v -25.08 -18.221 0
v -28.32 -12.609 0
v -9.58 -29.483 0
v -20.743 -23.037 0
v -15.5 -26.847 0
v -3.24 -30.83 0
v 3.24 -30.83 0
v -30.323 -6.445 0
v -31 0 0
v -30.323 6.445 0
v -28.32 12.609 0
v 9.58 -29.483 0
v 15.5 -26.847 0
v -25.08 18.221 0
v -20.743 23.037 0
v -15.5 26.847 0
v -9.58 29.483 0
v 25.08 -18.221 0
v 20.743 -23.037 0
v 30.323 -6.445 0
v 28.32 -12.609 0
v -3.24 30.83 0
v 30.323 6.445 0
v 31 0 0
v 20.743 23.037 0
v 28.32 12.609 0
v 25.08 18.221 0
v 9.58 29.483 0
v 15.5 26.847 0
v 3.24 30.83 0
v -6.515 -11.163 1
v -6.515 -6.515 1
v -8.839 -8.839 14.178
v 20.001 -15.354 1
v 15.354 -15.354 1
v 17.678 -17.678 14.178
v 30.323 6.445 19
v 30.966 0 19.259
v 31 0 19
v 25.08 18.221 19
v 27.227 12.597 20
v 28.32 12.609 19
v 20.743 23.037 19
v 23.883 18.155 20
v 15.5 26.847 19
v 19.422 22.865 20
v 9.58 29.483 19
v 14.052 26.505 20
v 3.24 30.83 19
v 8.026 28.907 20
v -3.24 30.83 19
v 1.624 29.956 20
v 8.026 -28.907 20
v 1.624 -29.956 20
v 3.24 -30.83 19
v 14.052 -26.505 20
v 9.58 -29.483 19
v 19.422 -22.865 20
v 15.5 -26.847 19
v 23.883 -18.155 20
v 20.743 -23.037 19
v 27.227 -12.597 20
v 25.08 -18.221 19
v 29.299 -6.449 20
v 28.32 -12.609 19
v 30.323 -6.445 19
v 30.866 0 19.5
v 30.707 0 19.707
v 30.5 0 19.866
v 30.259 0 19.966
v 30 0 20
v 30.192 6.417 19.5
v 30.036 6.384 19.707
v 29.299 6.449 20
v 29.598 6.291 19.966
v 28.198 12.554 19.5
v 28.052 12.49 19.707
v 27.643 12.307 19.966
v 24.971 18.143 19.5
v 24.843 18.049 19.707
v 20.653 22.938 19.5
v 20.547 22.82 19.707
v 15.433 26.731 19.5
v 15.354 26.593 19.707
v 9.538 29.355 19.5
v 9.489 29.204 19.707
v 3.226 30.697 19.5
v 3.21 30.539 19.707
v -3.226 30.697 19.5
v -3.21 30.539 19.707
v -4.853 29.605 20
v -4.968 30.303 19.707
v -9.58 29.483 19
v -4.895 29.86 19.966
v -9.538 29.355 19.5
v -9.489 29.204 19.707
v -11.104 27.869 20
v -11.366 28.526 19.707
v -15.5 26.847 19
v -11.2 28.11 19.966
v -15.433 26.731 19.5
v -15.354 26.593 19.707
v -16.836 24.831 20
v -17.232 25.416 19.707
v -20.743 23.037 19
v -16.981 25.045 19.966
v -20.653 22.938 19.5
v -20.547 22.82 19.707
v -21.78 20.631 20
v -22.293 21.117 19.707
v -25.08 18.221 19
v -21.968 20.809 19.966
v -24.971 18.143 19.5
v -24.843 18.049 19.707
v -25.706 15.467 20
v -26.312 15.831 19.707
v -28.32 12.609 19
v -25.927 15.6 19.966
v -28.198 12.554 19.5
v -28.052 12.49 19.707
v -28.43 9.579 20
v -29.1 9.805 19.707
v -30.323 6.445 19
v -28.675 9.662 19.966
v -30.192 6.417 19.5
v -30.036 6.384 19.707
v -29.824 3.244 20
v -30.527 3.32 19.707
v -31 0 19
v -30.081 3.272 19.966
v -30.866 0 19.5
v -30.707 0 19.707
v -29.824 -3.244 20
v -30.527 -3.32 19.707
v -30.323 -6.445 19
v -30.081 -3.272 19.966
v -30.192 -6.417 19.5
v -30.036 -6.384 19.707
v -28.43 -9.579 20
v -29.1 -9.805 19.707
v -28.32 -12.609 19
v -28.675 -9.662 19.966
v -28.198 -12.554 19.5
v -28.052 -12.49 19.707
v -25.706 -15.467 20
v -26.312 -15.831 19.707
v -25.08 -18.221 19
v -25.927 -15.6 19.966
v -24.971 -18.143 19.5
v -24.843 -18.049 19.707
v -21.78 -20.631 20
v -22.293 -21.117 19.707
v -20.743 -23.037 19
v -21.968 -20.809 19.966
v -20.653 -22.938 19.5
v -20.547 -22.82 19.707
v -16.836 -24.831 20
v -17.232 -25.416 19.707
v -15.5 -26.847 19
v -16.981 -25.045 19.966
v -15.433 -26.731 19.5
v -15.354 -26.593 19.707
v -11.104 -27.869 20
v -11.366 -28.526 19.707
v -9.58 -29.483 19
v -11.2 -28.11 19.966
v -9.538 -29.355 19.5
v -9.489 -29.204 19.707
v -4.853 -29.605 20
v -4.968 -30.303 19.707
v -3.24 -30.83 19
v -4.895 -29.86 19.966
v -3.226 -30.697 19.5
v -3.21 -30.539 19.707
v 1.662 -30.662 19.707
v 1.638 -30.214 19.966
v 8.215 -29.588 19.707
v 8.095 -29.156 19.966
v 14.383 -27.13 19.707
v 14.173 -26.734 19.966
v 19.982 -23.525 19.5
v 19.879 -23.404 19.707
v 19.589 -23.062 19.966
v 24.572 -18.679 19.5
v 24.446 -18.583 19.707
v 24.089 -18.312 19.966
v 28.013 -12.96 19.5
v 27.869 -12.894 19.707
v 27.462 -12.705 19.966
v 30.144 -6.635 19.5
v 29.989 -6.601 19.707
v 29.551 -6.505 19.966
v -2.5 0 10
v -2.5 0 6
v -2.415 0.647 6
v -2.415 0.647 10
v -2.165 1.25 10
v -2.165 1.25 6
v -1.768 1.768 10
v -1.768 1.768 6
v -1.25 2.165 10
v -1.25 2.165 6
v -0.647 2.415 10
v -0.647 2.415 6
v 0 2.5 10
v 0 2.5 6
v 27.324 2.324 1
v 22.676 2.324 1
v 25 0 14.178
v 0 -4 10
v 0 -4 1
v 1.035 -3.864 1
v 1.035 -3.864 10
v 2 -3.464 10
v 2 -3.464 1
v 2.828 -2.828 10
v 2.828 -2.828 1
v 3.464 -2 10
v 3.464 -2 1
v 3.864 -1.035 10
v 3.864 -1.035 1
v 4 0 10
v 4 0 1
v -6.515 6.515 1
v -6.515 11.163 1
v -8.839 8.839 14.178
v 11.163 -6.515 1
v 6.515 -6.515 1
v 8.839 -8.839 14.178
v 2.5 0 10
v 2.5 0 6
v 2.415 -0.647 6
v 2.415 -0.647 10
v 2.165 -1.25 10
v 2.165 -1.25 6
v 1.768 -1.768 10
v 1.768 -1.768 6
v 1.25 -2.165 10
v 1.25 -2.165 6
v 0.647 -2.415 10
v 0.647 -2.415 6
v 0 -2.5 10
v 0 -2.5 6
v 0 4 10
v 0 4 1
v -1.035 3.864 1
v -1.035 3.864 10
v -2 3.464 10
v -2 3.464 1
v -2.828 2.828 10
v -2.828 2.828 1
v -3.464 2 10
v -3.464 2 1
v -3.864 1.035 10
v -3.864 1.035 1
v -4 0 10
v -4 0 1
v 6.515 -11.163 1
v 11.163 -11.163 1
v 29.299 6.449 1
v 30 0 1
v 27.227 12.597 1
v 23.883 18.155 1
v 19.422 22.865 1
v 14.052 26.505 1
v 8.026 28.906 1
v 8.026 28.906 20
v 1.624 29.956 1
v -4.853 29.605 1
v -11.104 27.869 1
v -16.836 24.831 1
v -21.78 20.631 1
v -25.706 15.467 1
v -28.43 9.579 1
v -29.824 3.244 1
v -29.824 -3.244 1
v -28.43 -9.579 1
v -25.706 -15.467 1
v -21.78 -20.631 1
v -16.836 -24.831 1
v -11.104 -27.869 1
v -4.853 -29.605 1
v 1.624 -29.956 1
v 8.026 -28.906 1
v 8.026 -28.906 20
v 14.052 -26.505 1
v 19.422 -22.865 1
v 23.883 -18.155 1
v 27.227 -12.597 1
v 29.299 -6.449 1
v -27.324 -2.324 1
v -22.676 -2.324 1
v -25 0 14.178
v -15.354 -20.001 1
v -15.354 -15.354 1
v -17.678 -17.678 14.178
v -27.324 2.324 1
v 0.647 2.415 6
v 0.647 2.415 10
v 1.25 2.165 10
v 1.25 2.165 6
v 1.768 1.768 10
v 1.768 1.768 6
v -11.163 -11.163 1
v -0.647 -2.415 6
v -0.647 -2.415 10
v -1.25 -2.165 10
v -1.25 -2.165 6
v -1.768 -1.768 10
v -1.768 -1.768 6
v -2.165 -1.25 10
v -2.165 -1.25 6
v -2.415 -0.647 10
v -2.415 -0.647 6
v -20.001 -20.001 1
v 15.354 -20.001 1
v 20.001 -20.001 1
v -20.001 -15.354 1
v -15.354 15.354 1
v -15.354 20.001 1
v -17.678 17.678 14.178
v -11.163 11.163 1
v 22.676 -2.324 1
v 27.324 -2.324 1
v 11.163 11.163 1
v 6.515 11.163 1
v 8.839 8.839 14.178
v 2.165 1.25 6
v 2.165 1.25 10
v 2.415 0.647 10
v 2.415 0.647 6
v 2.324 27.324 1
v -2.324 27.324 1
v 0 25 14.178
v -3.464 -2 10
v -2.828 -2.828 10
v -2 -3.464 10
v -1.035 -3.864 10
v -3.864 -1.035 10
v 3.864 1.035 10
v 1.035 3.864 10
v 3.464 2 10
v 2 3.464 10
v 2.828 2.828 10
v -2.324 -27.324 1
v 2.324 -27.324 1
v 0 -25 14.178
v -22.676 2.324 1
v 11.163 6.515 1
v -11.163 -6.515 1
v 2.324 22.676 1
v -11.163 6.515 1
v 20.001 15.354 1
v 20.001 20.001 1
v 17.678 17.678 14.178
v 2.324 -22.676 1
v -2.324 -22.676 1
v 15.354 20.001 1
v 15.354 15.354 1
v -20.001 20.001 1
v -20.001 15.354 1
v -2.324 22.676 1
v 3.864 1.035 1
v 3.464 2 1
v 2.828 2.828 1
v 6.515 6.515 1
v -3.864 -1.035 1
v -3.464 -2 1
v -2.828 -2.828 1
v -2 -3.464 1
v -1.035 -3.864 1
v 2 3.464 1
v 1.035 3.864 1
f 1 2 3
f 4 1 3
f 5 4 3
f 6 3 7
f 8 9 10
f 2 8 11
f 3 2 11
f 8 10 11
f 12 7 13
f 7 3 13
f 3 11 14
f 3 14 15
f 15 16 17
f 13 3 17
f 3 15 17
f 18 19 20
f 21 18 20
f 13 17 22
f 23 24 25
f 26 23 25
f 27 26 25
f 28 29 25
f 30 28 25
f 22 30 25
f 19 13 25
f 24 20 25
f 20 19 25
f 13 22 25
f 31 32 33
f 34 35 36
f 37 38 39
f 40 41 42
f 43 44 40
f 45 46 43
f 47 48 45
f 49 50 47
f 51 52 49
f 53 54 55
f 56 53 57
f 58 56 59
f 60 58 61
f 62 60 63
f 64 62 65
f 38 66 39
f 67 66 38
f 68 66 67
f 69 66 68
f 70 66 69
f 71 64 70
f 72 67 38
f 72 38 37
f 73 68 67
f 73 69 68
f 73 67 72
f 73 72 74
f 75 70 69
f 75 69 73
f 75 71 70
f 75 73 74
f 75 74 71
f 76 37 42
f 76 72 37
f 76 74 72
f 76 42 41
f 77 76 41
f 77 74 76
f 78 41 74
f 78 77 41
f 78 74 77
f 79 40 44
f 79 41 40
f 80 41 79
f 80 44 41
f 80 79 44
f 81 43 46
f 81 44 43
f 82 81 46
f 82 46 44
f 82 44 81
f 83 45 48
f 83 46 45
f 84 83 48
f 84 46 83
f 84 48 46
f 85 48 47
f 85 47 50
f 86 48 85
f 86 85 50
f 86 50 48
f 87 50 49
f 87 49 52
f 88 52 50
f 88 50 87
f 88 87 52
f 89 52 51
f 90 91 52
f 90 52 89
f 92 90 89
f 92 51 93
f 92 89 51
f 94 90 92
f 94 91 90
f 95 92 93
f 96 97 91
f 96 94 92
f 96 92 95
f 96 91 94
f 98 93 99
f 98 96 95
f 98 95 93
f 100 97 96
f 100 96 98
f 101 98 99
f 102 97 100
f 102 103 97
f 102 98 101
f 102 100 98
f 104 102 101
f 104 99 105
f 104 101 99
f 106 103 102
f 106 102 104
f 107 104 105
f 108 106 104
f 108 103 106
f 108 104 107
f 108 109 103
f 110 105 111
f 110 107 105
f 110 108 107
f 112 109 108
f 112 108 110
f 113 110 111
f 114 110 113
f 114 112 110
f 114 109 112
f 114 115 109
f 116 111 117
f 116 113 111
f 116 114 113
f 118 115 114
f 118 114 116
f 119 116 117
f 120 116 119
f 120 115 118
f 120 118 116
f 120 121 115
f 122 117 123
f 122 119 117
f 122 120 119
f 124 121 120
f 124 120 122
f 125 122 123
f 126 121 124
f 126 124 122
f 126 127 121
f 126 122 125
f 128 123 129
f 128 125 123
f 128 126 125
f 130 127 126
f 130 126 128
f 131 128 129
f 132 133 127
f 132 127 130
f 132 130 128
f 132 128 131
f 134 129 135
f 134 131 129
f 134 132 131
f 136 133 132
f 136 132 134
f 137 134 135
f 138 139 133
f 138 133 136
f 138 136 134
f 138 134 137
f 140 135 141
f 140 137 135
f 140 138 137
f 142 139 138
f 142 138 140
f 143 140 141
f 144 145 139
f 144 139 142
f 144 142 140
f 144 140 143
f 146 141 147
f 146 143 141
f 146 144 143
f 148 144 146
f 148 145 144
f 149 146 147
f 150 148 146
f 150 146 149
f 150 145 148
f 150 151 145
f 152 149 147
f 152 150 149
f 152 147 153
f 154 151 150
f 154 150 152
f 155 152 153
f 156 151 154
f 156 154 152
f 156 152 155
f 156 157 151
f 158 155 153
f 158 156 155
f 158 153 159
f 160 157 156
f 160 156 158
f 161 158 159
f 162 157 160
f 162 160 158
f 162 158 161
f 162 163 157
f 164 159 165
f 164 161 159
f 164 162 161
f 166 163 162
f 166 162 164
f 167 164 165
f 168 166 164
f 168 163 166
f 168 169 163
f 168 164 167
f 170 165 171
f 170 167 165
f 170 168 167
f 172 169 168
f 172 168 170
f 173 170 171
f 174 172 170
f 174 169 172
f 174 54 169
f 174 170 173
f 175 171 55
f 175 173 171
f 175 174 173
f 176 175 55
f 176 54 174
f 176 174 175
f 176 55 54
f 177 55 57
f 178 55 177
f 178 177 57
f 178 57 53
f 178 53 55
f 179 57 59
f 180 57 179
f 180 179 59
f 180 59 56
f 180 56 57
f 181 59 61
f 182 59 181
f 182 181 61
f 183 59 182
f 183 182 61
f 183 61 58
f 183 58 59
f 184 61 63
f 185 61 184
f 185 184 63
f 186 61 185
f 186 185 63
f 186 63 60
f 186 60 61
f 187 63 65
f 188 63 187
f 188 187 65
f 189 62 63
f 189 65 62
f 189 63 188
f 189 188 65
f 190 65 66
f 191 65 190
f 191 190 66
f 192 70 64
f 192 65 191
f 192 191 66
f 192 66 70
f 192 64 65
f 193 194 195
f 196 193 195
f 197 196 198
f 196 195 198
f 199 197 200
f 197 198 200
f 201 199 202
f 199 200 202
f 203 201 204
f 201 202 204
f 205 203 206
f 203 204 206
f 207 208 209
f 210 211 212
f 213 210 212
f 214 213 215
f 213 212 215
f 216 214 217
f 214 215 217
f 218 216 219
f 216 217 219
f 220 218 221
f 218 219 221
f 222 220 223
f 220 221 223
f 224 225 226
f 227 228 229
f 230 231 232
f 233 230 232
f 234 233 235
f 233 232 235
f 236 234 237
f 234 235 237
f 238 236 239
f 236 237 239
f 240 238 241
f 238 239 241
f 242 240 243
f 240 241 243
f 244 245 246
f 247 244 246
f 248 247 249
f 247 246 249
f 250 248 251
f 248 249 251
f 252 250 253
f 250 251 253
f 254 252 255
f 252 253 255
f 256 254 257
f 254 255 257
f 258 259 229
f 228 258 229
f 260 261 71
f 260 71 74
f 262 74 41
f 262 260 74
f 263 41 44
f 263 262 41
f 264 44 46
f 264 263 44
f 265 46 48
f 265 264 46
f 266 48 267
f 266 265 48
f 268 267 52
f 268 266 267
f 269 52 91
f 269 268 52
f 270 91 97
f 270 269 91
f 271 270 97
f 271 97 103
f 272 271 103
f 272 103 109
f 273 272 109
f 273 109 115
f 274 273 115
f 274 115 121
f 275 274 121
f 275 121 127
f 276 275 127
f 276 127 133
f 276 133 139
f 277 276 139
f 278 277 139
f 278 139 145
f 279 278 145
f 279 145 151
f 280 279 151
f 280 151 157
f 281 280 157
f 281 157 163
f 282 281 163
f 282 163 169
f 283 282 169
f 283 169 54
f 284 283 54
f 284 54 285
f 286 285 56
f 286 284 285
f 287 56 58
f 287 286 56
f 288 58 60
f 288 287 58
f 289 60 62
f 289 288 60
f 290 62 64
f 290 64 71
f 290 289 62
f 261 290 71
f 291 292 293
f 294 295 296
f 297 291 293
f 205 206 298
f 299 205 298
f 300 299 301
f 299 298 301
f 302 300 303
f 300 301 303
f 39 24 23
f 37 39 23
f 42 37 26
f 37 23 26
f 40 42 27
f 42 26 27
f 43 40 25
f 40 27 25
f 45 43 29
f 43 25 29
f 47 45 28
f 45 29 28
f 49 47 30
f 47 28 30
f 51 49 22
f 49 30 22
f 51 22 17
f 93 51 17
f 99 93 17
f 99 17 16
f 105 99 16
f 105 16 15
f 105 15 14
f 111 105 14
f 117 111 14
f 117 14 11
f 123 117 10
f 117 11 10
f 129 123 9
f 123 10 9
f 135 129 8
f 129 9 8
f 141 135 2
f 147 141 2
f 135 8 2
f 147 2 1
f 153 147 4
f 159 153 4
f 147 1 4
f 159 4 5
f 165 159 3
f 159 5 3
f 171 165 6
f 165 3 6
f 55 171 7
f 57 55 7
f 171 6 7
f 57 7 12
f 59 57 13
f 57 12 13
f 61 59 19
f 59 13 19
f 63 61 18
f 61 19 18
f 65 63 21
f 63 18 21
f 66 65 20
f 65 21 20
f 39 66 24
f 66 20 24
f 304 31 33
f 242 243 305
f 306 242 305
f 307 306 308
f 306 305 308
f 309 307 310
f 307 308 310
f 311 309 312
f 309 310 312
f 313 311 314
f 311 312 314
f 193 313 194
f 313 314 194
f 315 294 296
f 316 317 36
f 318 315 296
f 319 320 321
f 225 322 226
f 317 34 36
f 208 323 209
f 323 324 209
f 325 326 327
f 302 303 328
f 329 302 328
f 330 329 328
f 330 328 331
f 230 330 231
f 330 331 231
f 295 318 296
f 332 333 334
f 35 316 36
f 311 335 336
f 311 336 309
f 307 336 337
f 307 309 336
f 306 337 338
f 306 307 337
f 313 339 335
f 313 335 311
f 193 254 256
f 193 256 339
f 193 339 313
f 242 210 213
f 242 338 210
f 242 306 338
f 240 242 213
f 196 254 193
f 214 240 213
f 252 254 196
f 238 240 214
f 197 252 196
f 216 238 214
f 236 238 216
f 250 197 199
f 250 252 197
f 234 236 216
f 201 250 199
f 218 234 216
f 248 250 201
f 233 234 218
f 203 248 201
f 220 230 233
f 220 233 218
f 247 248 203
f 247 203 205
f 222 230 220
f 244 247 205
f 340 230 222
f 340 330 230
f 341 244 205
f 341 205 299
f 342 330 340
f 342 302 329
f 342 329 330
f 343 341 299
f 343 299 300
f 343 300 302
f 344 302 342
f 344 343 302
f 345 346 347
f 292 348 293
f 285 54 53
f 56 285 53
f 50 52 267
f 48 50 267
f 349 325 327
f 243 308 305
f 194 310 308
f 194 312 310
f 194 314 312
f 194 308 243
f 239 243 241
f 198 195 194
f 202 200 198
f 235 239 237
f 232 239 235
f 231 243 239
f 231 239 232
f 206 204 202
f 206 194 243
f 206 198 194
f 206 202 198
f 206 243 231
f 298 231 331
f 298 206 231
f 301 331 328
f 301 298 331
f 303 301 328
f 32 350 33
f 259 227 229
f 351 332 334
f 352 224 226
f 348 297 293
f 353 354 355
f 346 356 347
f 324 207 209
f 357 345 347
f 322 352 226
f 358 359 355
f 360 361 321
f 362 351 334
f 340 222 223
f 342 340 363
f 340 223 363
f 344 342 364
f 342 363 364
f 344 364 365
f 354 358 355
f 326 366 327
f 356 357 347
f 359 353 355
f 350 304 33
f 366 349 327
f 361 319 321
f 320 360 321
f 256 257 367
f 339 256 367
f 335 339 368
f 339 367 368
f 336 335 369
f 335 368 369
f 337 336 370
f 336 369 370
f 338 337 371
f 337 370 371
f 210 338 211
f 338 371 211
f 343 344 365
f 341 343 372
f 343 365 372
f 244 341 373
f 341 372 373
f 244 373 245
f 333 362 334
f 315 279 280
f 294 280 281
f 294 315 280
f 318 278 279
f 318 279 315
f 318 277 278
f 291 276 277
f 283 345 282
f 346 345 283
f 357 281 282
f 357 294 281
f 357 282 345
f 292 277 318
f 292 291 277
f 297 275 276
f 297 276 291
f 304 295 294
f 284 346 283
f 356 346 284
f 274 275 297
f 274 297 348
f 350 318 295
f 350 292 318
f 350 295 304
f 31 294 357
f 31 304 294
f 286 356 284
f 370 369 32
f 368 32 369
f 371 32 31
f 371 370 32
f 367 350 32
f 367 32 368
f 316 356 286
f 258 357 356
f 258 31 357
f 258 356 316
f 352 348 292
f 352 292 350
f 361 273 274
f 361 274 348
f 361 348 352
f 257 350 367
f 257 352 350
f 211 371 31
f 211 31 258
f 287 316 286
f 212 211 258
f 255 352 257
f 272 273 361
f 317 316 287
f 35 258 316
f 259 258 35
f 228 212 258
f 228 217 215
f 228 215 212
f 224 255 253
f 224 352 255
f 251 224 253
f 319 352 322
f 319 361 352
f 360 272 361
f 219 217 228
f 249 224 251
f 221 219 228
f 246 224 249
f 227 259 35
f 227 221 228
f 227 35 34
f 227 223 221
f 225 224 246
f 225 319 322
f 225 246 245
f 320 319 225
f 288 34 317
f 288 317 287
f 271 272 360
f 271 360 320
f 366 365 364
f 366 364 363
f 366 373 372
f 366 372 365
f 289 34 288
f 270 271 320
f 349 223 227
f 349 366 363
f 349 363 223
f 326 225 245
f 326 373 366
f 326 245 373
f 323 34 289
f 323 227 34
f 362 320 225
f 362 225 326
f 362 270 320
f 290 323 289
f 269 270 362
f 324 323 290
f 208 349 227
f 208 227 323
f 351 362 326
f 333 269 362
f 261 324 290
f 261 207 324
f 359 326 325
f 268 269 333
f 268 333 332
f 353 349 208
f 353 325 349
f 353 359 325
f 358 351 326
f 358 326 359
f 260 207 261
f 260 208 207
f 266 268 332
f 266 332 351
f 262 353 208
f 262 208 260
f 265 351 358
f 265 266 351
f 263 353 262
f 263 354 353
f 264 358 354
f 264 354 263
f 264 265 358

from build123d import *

# Parameters (mm, degrees)
F0_R     = 31
F0_R_2   = 30
F0_W     = 5
F0_H     = 5
F1_DEPTH = 1
F2_DEPTH = 20
F3_DEPTH = 10
F4_DEPTH = 15
F4_TAPER = 10
F5_R     = 0.99999
F6_DEPTH = 5


# Not quite as in the source:
# - a fillet or chamfer is up to 0.001 mm smaller than in the source, because OpenCascade refuses the exact size


with BuildPart() as f1:
    # F0 (on Top) → F1 (new body)
    with BuildSketch(Plane.XY):
        Circle(F0_R)
        Circle(F0_R_2, mode=Mode.SUBTRACT)
        Circle(F0_R_2)
        with Locations((-17.6776695297, -17.6776695297)):
            Rectangle(F0_W, F0_H, mode=Mode.SUBTRACT)
        Polygon((-2.5, -22.5), (0, -22.5), (2.5, -22.5), (2.5, -27.5), (-2.5, -27.5), align=None, mode=Mode.SUBTRACT)
        with Locations((17.6776695297, -17.6776695297)):
            Rectangle(F0_W, F0_H, mode=Mode.SUBTRACT)
        Polygon((-22.5, 2.5), (-22.5, 0), (-22.5, -2.5), (-27.5, -2.5), (-27.5, 2.5), align=None, mode=Mode.SUBTRACT)
        with Locations((-17.6776695297, 17.6776695297)):
            Rectangle(F0_W, F0_H, mode=Mode.SUBTRACT)
        with BuildLine():
            ThreePointArc((-15.1776695297, 15.1776695297), (-8.2140955588, 19.8305809006), (0, 21.4644660941))
            ThreePointArc((0, 21.4644660941), (8.2140955588, 19.8305809006), (15.1776695297, 15.1776695297))
            ThreePointArc((15.1776695297, 15.1776695297), (19.8305809006, 8.2140955588), (21.4644660941, 0))
            ThreePointArc((21.4644660941, 0), (19.8305809006, -8.2140955588), (15.1776695297, -15.1776695297))
            ThreePointArc((15.1776695297, -15.1776695297), (8.2140955588, -19.8305809006), (0, -21.4644660941))
            ThreePointArc((0, -21.4644660941), (-8.2140955588, -19.8305809006), (-15.1776695297, -15.1776695297))
            ThreePointArc((-15.1776695297, -15.1776695297), (-19.8305809006, -8.2140955588), (-21.4644660941, 0))
            ThreePointArc((-21.4644660941, 0), (-19.8305809006, 8.2140955588), (-15.1776695297, 15.1776695297))
        make_face(mode=Mode.SUBTRACT)
        Polygon((22.5, -2.5), (22.5, 0), (22.5, 2.5), (27.5, 2.5), (27.5, -2.5), align=None, mode=Mode.SUBTRACT)
        Polygon((2.5, 22.5), (0, 22.5), (-2.5, 22.5), (-2.5, 27.5), (2.5, 27.5), align=None, mode=Mode.SUBTRACT)
        with Locations((17.6776695297, 17.6776695297)):
            Rectangle(F0_W, F0_H, mode=Mode.SUBTRACT)
        with BuildLine():
            Line((0, 21.4644660941), (0, 12.5))
            ThreePointArc((0, 12.5), (3.2848701936, 12.0606644847), (6.3388347648, 10.7735404498))
            Line((6.3388347648, 10.7735404498), (6.3388347648, 11.3388347648))
            Line((6.3388347648, 11.3388347648), (11.3388347648, 11.3388347648))
            Line((11.3388347648, 11.3388347648), (15.1776695297, 15.1776695297))
            ThreePointArc((15.1776695297, 15.1776695297), (8.2140955588, 19.8305809006), (0, 21.4644660941))
        make_face()
        with BuildLine():
            ThreePointArc((10.7735404498, 6.3388347648), (12.0606644847, 3.2848701936), (12.5, 0))
            Line((12.5, 0), (21.4644660941, 0))
            ThreePointArc((21.4644660941, 0), (19.8305809006, 8.2140955588), (15.1776695297, 15.1776695297))
            Line((15.1776695297, 15.1776695297), (11.3388347648, 11.3388347648))
            Line((11.3388347648, 11.3388347648), (11.3388347648, 6.3388347648))
            Line((11.3388347648, 6.3388347648), (10.7735404498, 6.3388347648))
        make_face()
        with BuildLine():
            ThreePointArc((6.3388347648, -10.7735404498), (3.2848701936, -12.0606644847), (0, -12.5))
            Line((0, -12.5), (0, -21.4644660941))
            ThreePointArc((0, -21.4644660941), (8.2140955588, -19.8305809006), (15.1776695297, -15.1776695297))
            ThreePointArc((15.1776695297, -15.1776695297), (19.8305809006, -8.2140955588), (21.4644660941, 0))
            Line((21.4644660941, 0), (12.5, 0))
            ThreePointArc((12.5, 0), (12.0606644847, -3.2848701936), (10.7735404498, -6.3388347648))
            Line((10.7735404498, -6.3388347648), (11.3388347648, -6.3388347648))
            Line((11.3388347648, -6.3388347648), (11.3388347648, -11.3388347648))
            Line((11.3388347648, -11.3388347648), (6.3388347648, -11.3388347648))
            Line((6.3388347648, -11.3388347648), (6.3388347648, -10.7735404498))
        make_face()
        with BuildLine():
            Line((0, -21.4644660941), (0, -12.5))
            ThreePointArc((0, -12.5), (-3.2848701936, -12.0606644847), (-6.3388347648, -10.7735404498))
            Line((-6.3388347648, -10.7735404498), (-6.3388347648, -11.3388347648))
            Line((-6.3388347648, -11.3388347648), (-11.3388347648, -11.3388347648))
            Line((-11.3388347648, -11.3388347648), (-11.3388347648, -6.3388347648))
            Line((-11.3388347648, -6.3388347648), (-10.7735404498, -6.3388347648))
            ThreePointArc((-10.7735404498, -6.3388347648), (-12.0606644847, -3.2848701936), (-12.5, 0))
            Line((-12.5, 0), (-21.4644660941, 0))
            ThreePointArc((-21.4644660941, 0), (-19.8305809006, -8.2140955588), (-15.1776695297, -15.1776695297))
            ThreePointArc((-15.1776695297, -15.1776695297), (-8.2140955588, -19.8305809006), (0, -21.4644660941))
        make_face()
        with BuildLine():
            ThreePointArc((-6.3388347648, 10.7735404498), (-3.2848701936, 12.0606644847), (0, 12.5))
            Line((0, 12.5), (0, 21.4644660941))
            ThreePointArc((0, 21.4644660941), (-8.2140955588, 19.8305809006), (-15.1776695297, 15.1776695297))
            ThreePointArc((-15.1776695297, 15.1776695297), (-19.8305809006, 8.2140955588), (-21.4644660941, 0))
            Line((-21.4644660941, 0), (-12.5, 0))
            ThreePointArc((-12.5, 0), (-12.0606644847, 3.2848701936), (-10.7735404498, 6.3388347648))
            Line((-10.7735404498, 6.3388347648), (-11.3388347648, 6.3388347648))
            Line((-11.3388347648, 6.3388347648), (-11.3388347648, 11.3388347648))
            Line((-11.3388347648, 11.3388347648), (-6.3388347648, 11.3388347648))
            Line((-6.3388347648, 11.3388347648), (-6.3388347648, 10.7735404498))
        make_face()
        with BuildLine():
            Line((0, 12.5), (0, 4))
            ThreePointArc((0, 4), (1.5307337295, 3.69551813), (2.8284271247, 2.8284271247))
            Line((2.8284271247, 2.8284271247), (6.3388347648, 6.3388347648))
            Line((6.3388347648, 6.3388347648), (6.3388347648, 10.7735404498))
            ThreePointArc((6.3388347648, 10.7735404498), (3.2848701936, 12.0606644847), (0, 12.5))
        make_face()
        with BuildLine():
            ThreePointArc((-4, 0), (-2.8284271247, 2.8284271247), (0, 4))
            Line((0, 4), (0, 12.5))
            ThreePointArc((0, 12.5), (-3.2848701936, 12.0606644847), (-6.3388347648, 10.7735404498))
            Line((-6.3388347648, 10.7735404498), (-6.3388347648, 6.3388347648))
            Line((-6.3388347648, 6.3388347648), (-10.7735404498, 6.3388347648))
            ThreePointArc((-10.7735404498, 6.3388347648), (-12.0606644847, 3.2848701936), (-12.5, 0))
            Line((-12.5, 0), (-4, 0))
        make_face()
        with BuildLine():
            ThreePointArc((2.8284271247, 2.8284271247), (3.69551813, 1.5307337295), (4, 0))
            Line((4, 0), (12.5, 0))
            ThreePointArc((12.5, 0), (12.0606644847, 3.2848701936), (10.7735404498, 6.3388347648))
            Line((10.7735404498, 6.3388347648), (6.3388347648, 6.3388347648))
            Line((6.3388347648, 6.3388347648), (2.8284271247, 2.8284271247))
        make_face()
        with BuildLine():
            ThreePointArc((4, 0), (2.8284271247, -2.8284271247), (0, -4))
            Line((0, -4), (0, -12.5))
            ThreePointArc((0, -12.5), (3.2848701936, -12.0606644847), (6.3388347648, -10.7735404498))
            Line((6.3388347648, -10.7735404498), (6.3388347648, -6.3388347648))
            Line((6.3388347648, -6.3388347648), (10.7735404498, -6.3388347648))
            ThreePointArc((10.7735404498, -6.3388347648), (12.0606644847, -3.2848701936), (12.5, 0))
            Line((12.5, 0), (4, 0))
        make_face()
        with BuildLine():
            Line((0, -12.5), (0, -4))
            ThreePointArc((0, -4), (-2.8284271247, -2.8284271247), (-4, 0))
            Line((-4, 0), (-12.5, 0))
            ThreePointArc((-12.5, 0), (-12.0606644847, -3.2848701936), (-10.7735404498, -6.3388347648))
            Line((-10.7735404498, -6.3388347648), (-6.3388347648, -6.3388347648))
            Line((-6.3388347648, -6.3388347648), (-6.3388347648, -10.7735404498))
            ThreePointArc((-6.3388347648, -10.7735404498), (-3.2848701936, -12.0606644847), (0, -12.5))
        make_face()
        Polygon((22.5, 2.5), (25, 0), (27.5, 2.5), align=None)
        Polygon((27.5, 2.5), (25, 0), (27.5, -2.5), align=None)
        Polygon((27.5, -2.5), (25, 0), (22.5, -2.5), align=None)
        Polygon((25, 0), (22.5, 0), (22.5, -2.5), align=None)
        Polygon((22.5, 2.5), (22.5, 0), (25, 0), align=None)
        Polygon((17.6776695297, 17.6776695297), (15.1776695297, 15.1776695297), (20.1776695297, 15.1776695297), align=None)
        Polygon((15.1776695297, 20.1776695297), (17.6776695297, 17.6776695297), (20.1776695297, 20.1776695297), align=None)
        Polygon((20.1776695297, 20.1776695297), (17.6776695297, 17.6776695297), (20.1776695297, 15.1776695297), align=None)
        Polygon((15.1776695297, 20.1776695297), (15.1776695297, 15.1776695297), (17.6776695297, 17.6776695297), align=None)
        Polygon((-2.5, 27.5), (0, 25), (2.5, 27.5), align=None)
        Polygon((2.5, 27.5), (0, 25), (2.5, 22.5), align=None)
        Polygon((-2.5, 22.5), (0, 22.5), (0, 25), align=None)
        Polygon((0, 25), (0, 22.5), (2.5, 22.5), align=None)
        Polygon((-2.5, 22.5), (0, 25), (-2.5, 27.5), align=None)
        Polygon((-17.6776695297, 17.6776695297), (-15.1776695297, 20.1776695297), (-20.1776695297, 20.1776695297), align=None)
        Polygon((-17.6776695297, 17.6776695297), (-15.1776695297, 15.1776695297), (-15.1776695297, 20.1776695297), align=None)
        Polygon((-20.1776695297, 15.1776695297), (-15.1776695297, 15.1776695297), (-17.6776695297, 17.6776695297), align=None)
        Polygon((-20.1776695297, 20.1776695297), (-20.1776695297, 15.1776695297), (-17.6776695297, 17.6776695297), align=None)
        Polygon((-8.8388347762, 8.8388347535), (-6.3388347648, 11.3388347648), (-11.3388347648, 11.3388347648), align=None)
        Polygon((-11.3388347648, 6.3388347648), (-8.8388347762, 8.8388347535), (-11.3388347648, 11.3388347648), align=None)
        with BuildLine():
            ThreePointArc((-8.8388347762, 8.8388347535), (-9.8855356702, 7.650240814), (-10.7735404498, 6.3388347648))
            Line((-10.7735404498, 6.3388347648), (-6.3388347648, 6.3388347648))
            Line((-6.3388347648, 6.3388347648), (-8.8388347648, 8.8388347648))
        make_face()
        with BuildLine():
            Line((-6.3388347648, 6.3388347648), (-6.3388347648, 10.7735404498))
            ThreePointArc((-6.3388347648, 10.7735404498), (-7.6502408267, 9.8855356604), (-8.8388347762, 8.8388347535))
            Line((-8.8388347648, 8.8388347648), (-6.3388347648, 6.3388347648))
        make_face()
        with BuildLine():
            Line((6.3388347648, 10.7735404498), (6.3388347648, 6.3388347648))
            Line((6.3388347648, 6.3388347648), (8.8388347648, 8.8388347648))
            ThreePointArc((8.8388347535, 8.8388347762), (7.650240814, 9.8855356702), (6.3388347648, 10.7735404498))
        make_face()
        Polygon((6.3388347648, 11.3388347648), (8.8388347535, 8.8388347762), (11.3388347648, 11.3388347648), align=None)
        Polygon((11.3388347648, 11.3388347648), (8.8388347648, 8.8388347648), (11.3388347648, 6.3388347648), align=None)
        with BuildLine():
            Line((8.8388347648, 8.8388347648), (6.3388347648, 6.3388347648))
            Line((6.3388347648, 6.3388347648), (10.7735404498, 6.3388347648))
            ThreePointArc((10.7735404498, 6.3388347648), (9.8855356604, 7.6502408267), (8.8388347535, 8.8388347762))
        make_face()
        with BuildLine():
            ThreePointArc((8.8388347578, -8.8388347719), (9.8855356623, -7.6502408243), (10.7735404498, -6.3388347648))
            Line((10.7735404498, -6.3388347648), (6.3388347648, -6.3388347648))
            Line((6.3388347648, -6.3388347648), (8.8388347648, -8.8388347648))
        make_face()
        Polygon((11.3388347648, -6.3388347648), (8.8388347578, -8.8388347719), (11.3388347648, -11.3388347648), align=None)
        Polygon((8.8388347578, -8.8388347719), (6.3388347648, -11.3388347648), (11.3388347648, -11.3388347648), align=None)
        with BuildLine():
            Line((6.3388347648, -6.3388347648), (6.3388347648, -10.7735404498))
            ThreePointArc((6.3388347648, -10.7735404498), (7.6502408164, -9.8855356684), (8.8388347578, -8.8388347719))
            Line((8.8388347648, -8.8388347648), (6.3388347648, -6.3388347648))
        make_face()
        with BuildLine():
            Line((-6.3388347648, -6.3388347648), (-10.7735404498, -6.3388347648))
            ThreePointArc((-10.7735404498, -6.3388347648), (-9.8855356524, -7.650240837), (-8.838834735, -8.8388347946))
            Line((-8.8388347648, -8.8388347648), (-6.3388347648, -6.3388347648))
        make_face()
        with BuildLine():
            ThreePointArc((-8.838834735, -8.8388347946), (-7.6502408037, -9.8855356782), (-6.3388347648, -10.7735404498))
            Line((-6.3388347648, -10.7735404498), (-6.3388347648, -6.3388347648))
            Line((-6.3388347648, -6.3388347648), (-8.8388347648, -8.8388347648))
        make_face()
        Polygon((-11.3388347648, -11.3388347648), (-6.3388347648, -11.3388347648), (-8.838834735, -8.8388347946), align=None)
        Polygon((-27.5, 2.5), (-25, 0), (-22.5, 2.5), align=None)
        Polygon((-25, 0), (-22.5, 0), (-22.5, 2.5), align=None)
        Polygon((-22.5, -2.5), (-22.5, 0), (-25, 0), align=None)
        Polygon((-22.5, -2.5), (-25, 0), (-27.5, -2.5), align=None)
        Polygon((-27.5, -2.5), (-25, 0), (-27.5, 2.5), align=None)
        with BuildLine():
            ThreePointArc((-2.5, 0), (-1.767766953, 1.767766953), (0, 2.5))
            Line((0, 2.5), (0, 4))
            ThreePointArc((0, 4), (-2.8284271247, 2.8284271247), (-4, 0))
            Line((-4, 0), (-2.5, 0))
        make_face()
        with BuildLine():
            ThreePointArc((2.5, 0), (1.767766953, -1.767766953), (0, -2.5))
            Line((0, -2.5), (0, -4))
            ThreePointArc((0, -4), (2.8284271247, -2.8284271247), (4, 0))
            Line((4, 0), (2.5, 0))
        make_face()
        with BuildLine():
            Line((0, -4), (0, -2.5))
            ThreePointArc((0, -2.5), (-1.767766953, -1.767766953), (-2.5, 0))
            Line((-2.5, 0), (-4, 0))
            ThreePointArc((-4, 0), (-2.8284271247, -2.8284271247), (0, -4))
        make_face()
        with BuildLine():
            ThreePointArc((1.767766953, 1.767766953), (2.3096988313, 0.9567085809), (2.5, 0))
            Line((2.5, 0), (4, 0))
            ThreePointArc((4, 0), (3.69551813, 1.5307337295), (2.8284271247, 2.8284271247))
            Line((2.8284271247, 2.8284271247), (1.767766953, 1.767766953))
        make_face()
        with BuildLine():
            Line((0, 4), (0, 2.5))
            ThreePointArc((0, 2.5), (0.9567085809, 2.3096988313), (1.767766953, 1.767766953))
            Line((1.767766953, 1.767766953), (2.8284271247, 2.8284271247))
            ThreePointArc((2.8284271247, 2.8284271247), (1.5307337295, 3.69551813), (0, 4))
        make_face()
        Polygon((-11.3388347648, -11.3388347648), (-8.8388347648, -8.8388347648), (-11.3388347648, -6.3388347648), align=None)
        Polygon((-17.6776695297, -17.6776695297), (-15.1776695297, -15.1776695297), (-20.1776695297, -15.1776695297), align=None)
        Polygon((-15.1776695297, -20.1776695297), (-15.1776695297, -15.1776695297), (-17.6776695297, -17.6776695297), align=None)
        Polygon((-20.1776695297, -20.1776695297), (-15.1776695297, -20.1776695297), (-17.6776695297, -17.6776695297), align=None)
        Polygon((-17.6776695297, -17.6776695297), (-20.1776695297, -15.1776695297), (-20.1776695297, -20.1776695297), align=None)
        Polygon((20.1776695297, -15.1776695297), (15.1776695297, -15.1776695297), (17.6776695297, -17.6776695297), align=None)
        Polygon((20.1776695297, -20.1776695297), (20.1776695297, -15.1776695297), (17.6776695297, -17.6776695297), align=None)
        Polygon((17.6776695297, -17.6776695297), (15.1776695297, -20.1776695297), (20.1776695297, -20.1776695297), align=None)
        Polygon((17.6776695297, -17.6776695297), (15.1776695297, -15.1776695297), (15.1776695297, -20.1776695297), align=None)
        Polygon((2.5, -22.5), (0, -25), (2.5, -27.5), align=None)
        Polygon((2.5, -27.5), (0, -25), (-2.5, -27.5), align=None)
        Polygon((-2.5, -27.5), (0, -25), (-2.5, -22.5), align=None)
        Polygon((0, -25), (0, -22.5), (-2.5, -22.5), align=None)
        Polygon((2.5, -22.5), (0, -22.5), (0, -25), align=None)
        with BuildLine():
            Line((11.3388347648, -6.3388347648), (10.7735404498, -6.3388347648))
            ThreePointArc((10.7735404498, -6.3388347648), (9.8855356623, -7.6502408243), (8.8388347578, -8.8388347719))
            Line((8.8388347578, -8.8388347719), (11.3388347648, -6.3388347648))
        make_face()
        with BuildLine():
            ThreePointArc((8.8388347578, -8.8388347719), (7.6502408164, -9.8855356684), (6.3388347648, -10.7735404498))
            Line((6.3388347648, -10.7735404498), (6.3388347648, -11.3388347648))
            Line((6.3388347648, -11.3388347648), (8.8388347578, -8.8388347719))
        make_face()
        with BuildLine():
            Line((-6.3388347648, -11.3388347648), (-6.3388347648, -10.7735404498))
            ThreePointArc((-6.3388347648, -10.7735404498), (-7.6502408037, -9.8855356782), (-8.838834735, -8.8388347946))
            Line((-8.838834735, -8.8388347946), (-6.3388347648, -11.3388347648))
        make_face()
        with BuildLine():
            ThreePointArc((-8.838834735, -8.8388347946), (-9.8855356524, -7.650240837), (-10.7735404498, -6.3388347648))
            Line((-10.7735404498, -6.3388347648), (-11.3388347648, -6.3388347648))
            Line((-11.3388347648, -6.3388347648), (-8.838834735, -8.8388347946))
        make_face()
        with BuildLine():
            ThreePointArc((8.8388347535, 8.8388347762), (9.8855356604, 7.6502408267), (10.7735404498, 6.3388347648))
            Line((10.7735404498, 6.3388347648), (11.3388347648, 6.3388347648))
            Line((11.3388347648, 6.3388347648), (8.8388347535, 8.8388347762))
        make_face()
        with BuildLine():
            Line((6.3388347648, 11.3388347648), (6.3388347648, 10.7735404498))
            ThreePointArc((6.3388347648, 10.7735404498), (7.650240814, 9.8855356702), (8.8388347535, 8.8388347762))
            Line((8.8388347535, 8.8388347762), (6.3388347648, 11.3388347648))
        make_face()
        with BuildLine():
            ThreePointArc((-8.8388347762, 8.8388347535), (-7.6502408267, 9.8855356604), (-6.3388347648, 10.7735404498))
            Line((-6.3388347648, 10.7735404498), (-6.3388347648, 11.3388347648))
            Line((-6.3388347648, 11.3388347648), (-8.8388347762, 8.8388347535))
        make_face()
        with BuildLine():
            Line((-11.3388347648, 6.3388347648), (-10.7735404498, 6.3388347648))
            ThreePointArc((-10.7735404498, 6.3388347648), (-9.8855356702, 7.650240814), (-8.8388347762, 8.8388347535))
            Line((-8.8388347762, 8.8388347535), (-11.3388347648, 6.3388347648))
        make_face()
        with BuildLine():
            Line((0, 2.5), (0, 0))
            Line((0, 0), (1.767766953, 1.767766953))
            ThreePointArc((1.767766953, 1.767766953), (0.9567085809, 2.3096988313), (0, 2.5))
        make_face()
        with BuildLine():
            Line((1.767766953, 1.767766953), (0, 0))
            Line((0, 0), (2.5, 0))
            ThreePointArc((2.5, 0), (2.3096988313, 0.9567085809), (1.767766953, 1.767766953))
        make_face()
        with BuildLine():
            Line((2.5, 0), (0, 0))
            Line((0, 0), (0, -2.5))
            ThreePointArc((0, -2.5), (1.767766953, -1.767766953), (2.5, 0))
        make_face()
        with BuildLine():
            Line((0, -2.5), (0, 0))
            Line((0, 0), (-2.5, 0))
            ThreePointArc((-2.5, 0), (-1.767766953, -1.767766953), (0, -2.5))
        make_face()
        with BuildLine():
            Line((-2.5, 0), (0, 0))
            Line((0, 0), (0, 2.5))
            ThreePointArc((0, 2.5), (-1.767766953, 1.767766953), (-2.5, 0))
        make_face()
    extrude(amount=F1_DEPTH)

    # F0 (on Top) → F2 (join)
    with BuildSketch(Plane.XY):
        Circle(F0_R)
        Circle(F0_R_2, mode=Mode.SUBTRACT)
    extrude(amount=F2_DEPTH)

    # F0 (on Top) → F3 (join)
    with BuildSketch(Plane.XY):
        with BuildLine():
            ThreePointArc((2.5, 0), (1.767766953, -1.767766953), (0, -2.5))
            Line((0, -2.5), (0, -4))
            ThreePointArc((0, -4), (2.8284271247, -2.8284271247), (4, 0))
            Line((4, 0), (2.5, 0))
        make_face()
        with BuildLine():
            ThreePointArc((1.767766953, 1.767766953), (2.3096988313, 0.9567085809), (2.5, 0))
            Line((2.5, 0), (4, 0))
            ThreePointArc((4, 0), (3.69551813, 1.5307337295), (2.8284271247, 2.8284271247))
            Line((2.8284271247, 2.8284271247), (1.767766953, 1.767766953))
        make_face()
        with BuildLine():
            Line((0, 4), (0, 2.5))
            ThreePointArc((0, 2.5), (0.9567085809, 2.3096988313), (1.767766953, 1.767766953))
            Line((1.767766953, 1.767766953), (2.8284271247, 2.8284271247))
            ThreePointArc((2.8284271247, 2.8284271247), (1.5307337295, 3.69551813), (0, 4))
        make_face()
        with BuildLine():
            ThreePointArc((-2.5, 0), (-1.767766953, 1.767766953), (0, 2.5))
            Line((0, 2.5), (0, 4))
            ThreePointArc((0, 4), (-2.8284271247, 2.8284271247), (-4, 0))
            Line((-4, 0), (-2.5, 0))
        make_face()
        with BuildLine():
            Line((0, -4), (0, -2.5))
            ThreePointArc((0, -2.5), (-1.767766953, -1.767766953), (-2.5, 0))
            Line((-2.5, 0), (-4, 0))
            ThreePointArc((-4, 0), (-2.8284271247, -2.8284271247), (0, -4))
        make_face()
    extrude(amount=F3_DEPTH)

    # F0 (on Top) → F4 (join)
    with BuildSketch(Plane.XY):
        Polygon((2.5, -27.5), (0, -25), (-2.5, -27.5), align=None)
        Polygon((2.5, -22.5), (0, -25), (2.5, -27.5), align=None)
        Polygon((2.5, -22.5), (0, -22.5), (0, -25), align=None)
        Polygon((0, -25), (0, -22.5), (-2.5, -22.5), align=None)
        Polygon((-2.5, -27.5), (0, -25), (-2.5, -22.5), align=None)
        Polygon((17.6776695297, -17.6776695297), (15.1776695297, -15.1776695297), (15.1776695297, -20.1776695297), align=None)
        Polygon((17.6776695297, -17.6776695297), (15.1776695297, -20.1776695297), (20.1776695297, -20.1776695297), align=None)
        Polygon((20.1776695297, -20.1776695297), (20.1776695297, -15.1776695297), (17.6776695297, -17.6776695297), align=None)
        Polygon((20.1776695297, -15.1776695297), (15.1776695297, -15.1776695297), (17.6776695297, -17.6776695297), align=None)
        Polygon((8.8388347578, -8.8388347719), (6.3388347648, -11.3388347648), (11.3388347648, -11.3388347648), align=None)
        with BuildLine():
            Line((6.3388347648, -6.3388347648), (6.3388347648, -10.7735404498))
            ThreePointArc((6.3388347648, -10.7735404498), (7.6502408164, -9.8855356684), (8.8388347578, -8.8388347719))
            Line((8.8388347648, -8.8388347648), (6.3388347648, -6.3388347648))
        make_face()
        Polygon((11.3388347648, -6.3388347648), (8.8388347578, -8.8388347719), (11.3388347648, -11.3388347648), align=None)
        with BuildLine():
            ThreePointArc((8.8388347578, -8.8388347719), (9.8855356623, -7.6502408243), (10.7735404498, -6.3388347648))
            Line((10.7735404498, -6.3388347648), (6.3388347648, -6.3388347648))
            Line((6.3388347648, -6.3388347648), (8.8388347648, -8.8388347648))
        make_face()
        with BuildLine():
            Line((11.3388347648, -6.3388347648), (10.7735404498, -6.3388347648))
            ThreePointArc((10.7735404498, -6.3388347648), (9.8855356623, -7.6502408243), (8.8388347578, -8.8388347719))
            Line((8.8388347578, -8.8388347719), (11.3388347648, -6.3388347648))
        make_face()
        with BuildLine():
            ThreePointArc((8.8388347578, -8.8388347719), (7.6502408164, -9.8855356684), (6.3388347648, -10.7735404498))
            Line((6.3388347648, -10.7735404498), (6.3388347648, -11.3388347648))
            Line((6.3388347648, -11.3388347648), (8.8388347578, -8.8388347719))
        make_face()
        Polygon((-11.3388347648, -11.3388347648), (-6.3388347648, -11.3388347648), (-8.838834735, -8.8388347946), align=None)
        with BuildLine():
            ThreePointArc((-8.838834735, -8.8388347946), (-7.6502408037, -9.8855356782), (-6.3388347648, -10.7735404498))
            Line((-6.3388347648, -10.7735404498), (-6.3388347648, -6.3388347648))
            Line((-6.3388347648, -6.3388347648), (-8.8388347648, -8.8388347648))
        make_face()
        with BuildLine():
            Line((-6.3388347648, -6.3388347648), (-10.7735404498, -6.3388347648))
            ThreePointArc((-10.7735404498, -6.3388347648), (-9.8855356524, -7.650240837), (-8.838834735, -8.8388347946))
            Line((-8.8388347648, -8.8388347648), (-6.3388347648, -6.3388347648))
        make_face()
        Polygon((-11.3388347648, -11.3388347648), (-8.8388347648, -8.8388347648), (-11.3388347648, -6.3388347648), align=None)
        with BuildLine():
            Line((-6.3388347648, -11.3388347648), (-6.3388347648, -10.7735404498))
            ThreePointArc((-6.3388347648, -10.7735404498), (-7.6502408037, -9.8855356782), (-8.838834735, -8.8388347946))
            Line((-8.838834735, -8.8388347946), (-6.3388347648, -11.3388347648))
        make_face()
        with BuildLine():
            ThreePointArc((-8.838834735, -8.8388347946), (-9.8855356524, -7.650240837), (-10.7735404498, -6.3388347648))
            Line((-10.7735404498, -6.3388347648), (-11.3388347648, -6.3388347648))
            Line((-11.3388347648, -6.3388347648), (-8.838834735, -8.8388347946))
        make_face()
        Polygon((-15.1776695297, -20.1776695297), (-15.1776695297, -15.1776695297), (-17.6776695297, -17.6776695297), align=None)
        Polygon((-20.1776695297, -20.1776695297), (-15.1776695297, -20.1776695297), (-17.6776695297, -17.6776695297), align=None)
        Polygon((-17.6776695297, -17.6776695297), (-20.1776695297, -15.1776695297), (-20.1776695297, -20.1776695297), align=None)
        Polygon((-17.6776695297, -17.6776695297), (-15.1776695297, -15.1776695297), (-20.1776695297, -15.1776695297), align=None)
        Polygon((-22.5, -2.5), (-25, 0), (-27.5, -2.5), align=None)
        Polygon((-22.5, -2.5), (-22.5, 0), (-25, 0), align=None)
        Polygon((-25, 0), (-22.5, 0), (-22.5, 2.5), align=None)
        Polygon((-27.5, 2.5), (-25, 0), (-22.5, 2.5), align=None)
        Polygon((-27.5, -2.5), (-25, 0), (-27.5, 2.5), align=None)
        Polygon((27.5, -2.5), (25, 0), (22.5, -2.5), align=None)
        Polygon((27.5, 2.5), (25, 0), (27.5, -2.5), align=None)
        Polygon((25, 0), (22.5, 0), (22.5, -2.5), align=None)
        Polygon((22.5, 2.5), (22.5, 0), (25, 0), align=None)
        Polygon((22.5, 2.5), (25, 0), (27.5, 2.5), align=None)
        with BuildLine():
            Line((6.3388347648, 10.7735404498), (6.3388347648, 6.3388347648))
            Line((6.3388347648, 6.3388347648), (8.8388347648, 8.8388347648))
            ThreePointArc((8.8388347535, 8.8388347762), (7.650240814, 9.8855356702), (6.3388347648, 10.7735404498))
        make_face()
        Polygon((11.3388347648, 11.3388347648), (8.8388347648, 8.8388347648), (11.3388347648, 6.3388347648), align=None)
        with BuildLine():
            Line((8.8388347648, 8.8388347648), (6.3388347648, 6.3388347648))
            Line((6.3388347648, 6.3388347648), (10.7735404498, 6.3388347648))
            ThreePointArc((10.7735404498, 6.3388347648), (9.8855356604, 7.6502408267), (8.8388347535, 8.8388347762))
        make_face()
        Polygon((6.3388347648, 11.3388347648), (8.8388347535, 8.8388347762), (11.3388347648, 11.3388347648), align=None)
        with BuildLine():
            ThreePointArc((8.8388347535, 8.8388347762), (9.8855356604, 7.6502408267), (10.7735404498, 6.3388347648))
            Line((10.7735404498, 6.3388347648), (11.3388347648, 6.3388347648))
            Line((11.3388347648, 6.3388347648), (8.8388347535, 8.8388347762))
        make_face()
        with BuildLine():
            Line((6.3388347648, 11.3388347648), (6.3388347648, 10.7735404498))
            ThreePointArc((6.3388347648, 10.7735404498), (7.650240814, 9.8855356702), (8.8388347535, 8.8388347762))
            Line((8.8388347535, 8.8388347762), (6.3388347648, 11.3388347648))
        make_face()
        with BuildLine():
            ThreePointArc((-8.8388347762, 8.8388347535), (-9.8855356702, 7.650240814), (-10.7735404498, 6.3388347648))
            Line((-10.7735404498, 6.3388347648), (-6.3388347648, 6.3388347648))
            Line((-6.3388347648, 6.3388347648), (-8.8388347648, 8.8388347648))
        make_face()
        with BuildLine():
            Line((-11.3388347648, 6.3388347648), (-10.7735404498, 6.3388347648))
            ThreePointArc((-10.7735404498, 6.3388347648), (-9.8855356702, 7.650240814), (-8.8388347762, 8.8388347535))
            Line((-8.8388347762, 8.8388347535), (-11.3388347648, 6.3388347648))
        make_face()
        Polygon((-11.3388347648, 6.3388347648), (-8.8388347762, 8.8388347535), (-11.3388347648, 11.3388347648), align=None)
        with BuildLine():
            Line((-6.3388347648, 6.3388347648), (-6.3388347648, 10.7735404498))
            ThreePointArc((-6.3388347648, 10.7735404498), (-7.6502408267, 9.8855356604), (-8.8388347762, 8.8388347535))
            Line((-8.8388347648, 8.8388347648), (-6.3388347648, 6.3388347648))
        make_face()
        Polygon((-8.8388347762, 8.8388347535), (-6.3388347648, 11.3388347648), (-11.3388347648, 11.3388347648), align=None)
        with BuildLine():
            ThreePointArc((-8.8388347762, 8.8388347535), (-7.6502408267, 9.8855356604), (-6.3388347648, 10.7735404498))
            Line((-6.3388347648, 10.7735404498), (-6.3388347648, 11.3388347648))
            Line((-6.3388347648, 11.3388347648), (-8.8388347762, 8.8388347535))
        make_face()
        Polygon((17.6776695297, 17.6776695297), (15.1776695297, 15.1776695297), (20.1776695297, 15.1776695297), align=None)
        Polygon((20.1776695297, 20.1776695297), (17.6776695297, 17.6776695297), (20.1776695297, 15.1776695297), align=None)
        Polygon((15.1776695297, 20.1776695297), (17.6776695297, 17.6776695297), (20.1776695297, 20.1776695297), align=None)
        Polygon((15.1776695297, 20.1776695297), (15.1776695297, 15.1776695297), (17.6776695297, 17.6776695297), align=None)
        Polygon((-20.1776695297, 15.1776695297), (-15.1776695297, 15.1776695297), (-17.6776695297, 17.6776695297), align=None)
        Polygon((-20.1776695297, 20.1776695297), (-20.1776695297, 15.1776695297), (-17.6776695297, 17.6776695297), align=None)
        Polygon((-17.6776695297, 17.6776695297), (-15.1776695297, 15.1776695297), (-15.1776695297, 20.1776695297), align=None)
        Polygon((-17.6776695297, 17.6776695297), (-15.1776695297, 20.1776695297), (-20.1776695297, 20.1776695297), align=None)
        Polygon((-2.5, 22.5), (0, 25), (-2.5, 27.5), align=None)
        Polygon((-2.5, 27.5), (0, 25), (2.5, 27.5), align=None)
        Polygon((2.5, 27.5), (0, 25), (2.5, 22.5), align=None)
        Polygon((0, 25), (0, 22.5), (2.5, 22.5), align=None)
        Polygon((-2.5, 22.5), (0, 22.5), (0, 25), align=None)
    extrude(amount=F4_DEPTH, taper=F4_TAPER)

    # F5 (radius 1 in the source; OpenCascade refuses exactly that, so slightly less here)
    f5_edges = [f1.edges().sort_by_distance(p)[0] for p in [
        (-31, 0, 20),
    ]]
    fillet(f5_edges, radius=F5_R)

    # F6 (add): a face of the model
    f6_faces = [f1.faces().sort_by_distance(p)[0] for p in [
        (0, 0, 1),
    ]]
    extrude(f6_faces, amount=F6_DEPTH)


solid = f1.part
